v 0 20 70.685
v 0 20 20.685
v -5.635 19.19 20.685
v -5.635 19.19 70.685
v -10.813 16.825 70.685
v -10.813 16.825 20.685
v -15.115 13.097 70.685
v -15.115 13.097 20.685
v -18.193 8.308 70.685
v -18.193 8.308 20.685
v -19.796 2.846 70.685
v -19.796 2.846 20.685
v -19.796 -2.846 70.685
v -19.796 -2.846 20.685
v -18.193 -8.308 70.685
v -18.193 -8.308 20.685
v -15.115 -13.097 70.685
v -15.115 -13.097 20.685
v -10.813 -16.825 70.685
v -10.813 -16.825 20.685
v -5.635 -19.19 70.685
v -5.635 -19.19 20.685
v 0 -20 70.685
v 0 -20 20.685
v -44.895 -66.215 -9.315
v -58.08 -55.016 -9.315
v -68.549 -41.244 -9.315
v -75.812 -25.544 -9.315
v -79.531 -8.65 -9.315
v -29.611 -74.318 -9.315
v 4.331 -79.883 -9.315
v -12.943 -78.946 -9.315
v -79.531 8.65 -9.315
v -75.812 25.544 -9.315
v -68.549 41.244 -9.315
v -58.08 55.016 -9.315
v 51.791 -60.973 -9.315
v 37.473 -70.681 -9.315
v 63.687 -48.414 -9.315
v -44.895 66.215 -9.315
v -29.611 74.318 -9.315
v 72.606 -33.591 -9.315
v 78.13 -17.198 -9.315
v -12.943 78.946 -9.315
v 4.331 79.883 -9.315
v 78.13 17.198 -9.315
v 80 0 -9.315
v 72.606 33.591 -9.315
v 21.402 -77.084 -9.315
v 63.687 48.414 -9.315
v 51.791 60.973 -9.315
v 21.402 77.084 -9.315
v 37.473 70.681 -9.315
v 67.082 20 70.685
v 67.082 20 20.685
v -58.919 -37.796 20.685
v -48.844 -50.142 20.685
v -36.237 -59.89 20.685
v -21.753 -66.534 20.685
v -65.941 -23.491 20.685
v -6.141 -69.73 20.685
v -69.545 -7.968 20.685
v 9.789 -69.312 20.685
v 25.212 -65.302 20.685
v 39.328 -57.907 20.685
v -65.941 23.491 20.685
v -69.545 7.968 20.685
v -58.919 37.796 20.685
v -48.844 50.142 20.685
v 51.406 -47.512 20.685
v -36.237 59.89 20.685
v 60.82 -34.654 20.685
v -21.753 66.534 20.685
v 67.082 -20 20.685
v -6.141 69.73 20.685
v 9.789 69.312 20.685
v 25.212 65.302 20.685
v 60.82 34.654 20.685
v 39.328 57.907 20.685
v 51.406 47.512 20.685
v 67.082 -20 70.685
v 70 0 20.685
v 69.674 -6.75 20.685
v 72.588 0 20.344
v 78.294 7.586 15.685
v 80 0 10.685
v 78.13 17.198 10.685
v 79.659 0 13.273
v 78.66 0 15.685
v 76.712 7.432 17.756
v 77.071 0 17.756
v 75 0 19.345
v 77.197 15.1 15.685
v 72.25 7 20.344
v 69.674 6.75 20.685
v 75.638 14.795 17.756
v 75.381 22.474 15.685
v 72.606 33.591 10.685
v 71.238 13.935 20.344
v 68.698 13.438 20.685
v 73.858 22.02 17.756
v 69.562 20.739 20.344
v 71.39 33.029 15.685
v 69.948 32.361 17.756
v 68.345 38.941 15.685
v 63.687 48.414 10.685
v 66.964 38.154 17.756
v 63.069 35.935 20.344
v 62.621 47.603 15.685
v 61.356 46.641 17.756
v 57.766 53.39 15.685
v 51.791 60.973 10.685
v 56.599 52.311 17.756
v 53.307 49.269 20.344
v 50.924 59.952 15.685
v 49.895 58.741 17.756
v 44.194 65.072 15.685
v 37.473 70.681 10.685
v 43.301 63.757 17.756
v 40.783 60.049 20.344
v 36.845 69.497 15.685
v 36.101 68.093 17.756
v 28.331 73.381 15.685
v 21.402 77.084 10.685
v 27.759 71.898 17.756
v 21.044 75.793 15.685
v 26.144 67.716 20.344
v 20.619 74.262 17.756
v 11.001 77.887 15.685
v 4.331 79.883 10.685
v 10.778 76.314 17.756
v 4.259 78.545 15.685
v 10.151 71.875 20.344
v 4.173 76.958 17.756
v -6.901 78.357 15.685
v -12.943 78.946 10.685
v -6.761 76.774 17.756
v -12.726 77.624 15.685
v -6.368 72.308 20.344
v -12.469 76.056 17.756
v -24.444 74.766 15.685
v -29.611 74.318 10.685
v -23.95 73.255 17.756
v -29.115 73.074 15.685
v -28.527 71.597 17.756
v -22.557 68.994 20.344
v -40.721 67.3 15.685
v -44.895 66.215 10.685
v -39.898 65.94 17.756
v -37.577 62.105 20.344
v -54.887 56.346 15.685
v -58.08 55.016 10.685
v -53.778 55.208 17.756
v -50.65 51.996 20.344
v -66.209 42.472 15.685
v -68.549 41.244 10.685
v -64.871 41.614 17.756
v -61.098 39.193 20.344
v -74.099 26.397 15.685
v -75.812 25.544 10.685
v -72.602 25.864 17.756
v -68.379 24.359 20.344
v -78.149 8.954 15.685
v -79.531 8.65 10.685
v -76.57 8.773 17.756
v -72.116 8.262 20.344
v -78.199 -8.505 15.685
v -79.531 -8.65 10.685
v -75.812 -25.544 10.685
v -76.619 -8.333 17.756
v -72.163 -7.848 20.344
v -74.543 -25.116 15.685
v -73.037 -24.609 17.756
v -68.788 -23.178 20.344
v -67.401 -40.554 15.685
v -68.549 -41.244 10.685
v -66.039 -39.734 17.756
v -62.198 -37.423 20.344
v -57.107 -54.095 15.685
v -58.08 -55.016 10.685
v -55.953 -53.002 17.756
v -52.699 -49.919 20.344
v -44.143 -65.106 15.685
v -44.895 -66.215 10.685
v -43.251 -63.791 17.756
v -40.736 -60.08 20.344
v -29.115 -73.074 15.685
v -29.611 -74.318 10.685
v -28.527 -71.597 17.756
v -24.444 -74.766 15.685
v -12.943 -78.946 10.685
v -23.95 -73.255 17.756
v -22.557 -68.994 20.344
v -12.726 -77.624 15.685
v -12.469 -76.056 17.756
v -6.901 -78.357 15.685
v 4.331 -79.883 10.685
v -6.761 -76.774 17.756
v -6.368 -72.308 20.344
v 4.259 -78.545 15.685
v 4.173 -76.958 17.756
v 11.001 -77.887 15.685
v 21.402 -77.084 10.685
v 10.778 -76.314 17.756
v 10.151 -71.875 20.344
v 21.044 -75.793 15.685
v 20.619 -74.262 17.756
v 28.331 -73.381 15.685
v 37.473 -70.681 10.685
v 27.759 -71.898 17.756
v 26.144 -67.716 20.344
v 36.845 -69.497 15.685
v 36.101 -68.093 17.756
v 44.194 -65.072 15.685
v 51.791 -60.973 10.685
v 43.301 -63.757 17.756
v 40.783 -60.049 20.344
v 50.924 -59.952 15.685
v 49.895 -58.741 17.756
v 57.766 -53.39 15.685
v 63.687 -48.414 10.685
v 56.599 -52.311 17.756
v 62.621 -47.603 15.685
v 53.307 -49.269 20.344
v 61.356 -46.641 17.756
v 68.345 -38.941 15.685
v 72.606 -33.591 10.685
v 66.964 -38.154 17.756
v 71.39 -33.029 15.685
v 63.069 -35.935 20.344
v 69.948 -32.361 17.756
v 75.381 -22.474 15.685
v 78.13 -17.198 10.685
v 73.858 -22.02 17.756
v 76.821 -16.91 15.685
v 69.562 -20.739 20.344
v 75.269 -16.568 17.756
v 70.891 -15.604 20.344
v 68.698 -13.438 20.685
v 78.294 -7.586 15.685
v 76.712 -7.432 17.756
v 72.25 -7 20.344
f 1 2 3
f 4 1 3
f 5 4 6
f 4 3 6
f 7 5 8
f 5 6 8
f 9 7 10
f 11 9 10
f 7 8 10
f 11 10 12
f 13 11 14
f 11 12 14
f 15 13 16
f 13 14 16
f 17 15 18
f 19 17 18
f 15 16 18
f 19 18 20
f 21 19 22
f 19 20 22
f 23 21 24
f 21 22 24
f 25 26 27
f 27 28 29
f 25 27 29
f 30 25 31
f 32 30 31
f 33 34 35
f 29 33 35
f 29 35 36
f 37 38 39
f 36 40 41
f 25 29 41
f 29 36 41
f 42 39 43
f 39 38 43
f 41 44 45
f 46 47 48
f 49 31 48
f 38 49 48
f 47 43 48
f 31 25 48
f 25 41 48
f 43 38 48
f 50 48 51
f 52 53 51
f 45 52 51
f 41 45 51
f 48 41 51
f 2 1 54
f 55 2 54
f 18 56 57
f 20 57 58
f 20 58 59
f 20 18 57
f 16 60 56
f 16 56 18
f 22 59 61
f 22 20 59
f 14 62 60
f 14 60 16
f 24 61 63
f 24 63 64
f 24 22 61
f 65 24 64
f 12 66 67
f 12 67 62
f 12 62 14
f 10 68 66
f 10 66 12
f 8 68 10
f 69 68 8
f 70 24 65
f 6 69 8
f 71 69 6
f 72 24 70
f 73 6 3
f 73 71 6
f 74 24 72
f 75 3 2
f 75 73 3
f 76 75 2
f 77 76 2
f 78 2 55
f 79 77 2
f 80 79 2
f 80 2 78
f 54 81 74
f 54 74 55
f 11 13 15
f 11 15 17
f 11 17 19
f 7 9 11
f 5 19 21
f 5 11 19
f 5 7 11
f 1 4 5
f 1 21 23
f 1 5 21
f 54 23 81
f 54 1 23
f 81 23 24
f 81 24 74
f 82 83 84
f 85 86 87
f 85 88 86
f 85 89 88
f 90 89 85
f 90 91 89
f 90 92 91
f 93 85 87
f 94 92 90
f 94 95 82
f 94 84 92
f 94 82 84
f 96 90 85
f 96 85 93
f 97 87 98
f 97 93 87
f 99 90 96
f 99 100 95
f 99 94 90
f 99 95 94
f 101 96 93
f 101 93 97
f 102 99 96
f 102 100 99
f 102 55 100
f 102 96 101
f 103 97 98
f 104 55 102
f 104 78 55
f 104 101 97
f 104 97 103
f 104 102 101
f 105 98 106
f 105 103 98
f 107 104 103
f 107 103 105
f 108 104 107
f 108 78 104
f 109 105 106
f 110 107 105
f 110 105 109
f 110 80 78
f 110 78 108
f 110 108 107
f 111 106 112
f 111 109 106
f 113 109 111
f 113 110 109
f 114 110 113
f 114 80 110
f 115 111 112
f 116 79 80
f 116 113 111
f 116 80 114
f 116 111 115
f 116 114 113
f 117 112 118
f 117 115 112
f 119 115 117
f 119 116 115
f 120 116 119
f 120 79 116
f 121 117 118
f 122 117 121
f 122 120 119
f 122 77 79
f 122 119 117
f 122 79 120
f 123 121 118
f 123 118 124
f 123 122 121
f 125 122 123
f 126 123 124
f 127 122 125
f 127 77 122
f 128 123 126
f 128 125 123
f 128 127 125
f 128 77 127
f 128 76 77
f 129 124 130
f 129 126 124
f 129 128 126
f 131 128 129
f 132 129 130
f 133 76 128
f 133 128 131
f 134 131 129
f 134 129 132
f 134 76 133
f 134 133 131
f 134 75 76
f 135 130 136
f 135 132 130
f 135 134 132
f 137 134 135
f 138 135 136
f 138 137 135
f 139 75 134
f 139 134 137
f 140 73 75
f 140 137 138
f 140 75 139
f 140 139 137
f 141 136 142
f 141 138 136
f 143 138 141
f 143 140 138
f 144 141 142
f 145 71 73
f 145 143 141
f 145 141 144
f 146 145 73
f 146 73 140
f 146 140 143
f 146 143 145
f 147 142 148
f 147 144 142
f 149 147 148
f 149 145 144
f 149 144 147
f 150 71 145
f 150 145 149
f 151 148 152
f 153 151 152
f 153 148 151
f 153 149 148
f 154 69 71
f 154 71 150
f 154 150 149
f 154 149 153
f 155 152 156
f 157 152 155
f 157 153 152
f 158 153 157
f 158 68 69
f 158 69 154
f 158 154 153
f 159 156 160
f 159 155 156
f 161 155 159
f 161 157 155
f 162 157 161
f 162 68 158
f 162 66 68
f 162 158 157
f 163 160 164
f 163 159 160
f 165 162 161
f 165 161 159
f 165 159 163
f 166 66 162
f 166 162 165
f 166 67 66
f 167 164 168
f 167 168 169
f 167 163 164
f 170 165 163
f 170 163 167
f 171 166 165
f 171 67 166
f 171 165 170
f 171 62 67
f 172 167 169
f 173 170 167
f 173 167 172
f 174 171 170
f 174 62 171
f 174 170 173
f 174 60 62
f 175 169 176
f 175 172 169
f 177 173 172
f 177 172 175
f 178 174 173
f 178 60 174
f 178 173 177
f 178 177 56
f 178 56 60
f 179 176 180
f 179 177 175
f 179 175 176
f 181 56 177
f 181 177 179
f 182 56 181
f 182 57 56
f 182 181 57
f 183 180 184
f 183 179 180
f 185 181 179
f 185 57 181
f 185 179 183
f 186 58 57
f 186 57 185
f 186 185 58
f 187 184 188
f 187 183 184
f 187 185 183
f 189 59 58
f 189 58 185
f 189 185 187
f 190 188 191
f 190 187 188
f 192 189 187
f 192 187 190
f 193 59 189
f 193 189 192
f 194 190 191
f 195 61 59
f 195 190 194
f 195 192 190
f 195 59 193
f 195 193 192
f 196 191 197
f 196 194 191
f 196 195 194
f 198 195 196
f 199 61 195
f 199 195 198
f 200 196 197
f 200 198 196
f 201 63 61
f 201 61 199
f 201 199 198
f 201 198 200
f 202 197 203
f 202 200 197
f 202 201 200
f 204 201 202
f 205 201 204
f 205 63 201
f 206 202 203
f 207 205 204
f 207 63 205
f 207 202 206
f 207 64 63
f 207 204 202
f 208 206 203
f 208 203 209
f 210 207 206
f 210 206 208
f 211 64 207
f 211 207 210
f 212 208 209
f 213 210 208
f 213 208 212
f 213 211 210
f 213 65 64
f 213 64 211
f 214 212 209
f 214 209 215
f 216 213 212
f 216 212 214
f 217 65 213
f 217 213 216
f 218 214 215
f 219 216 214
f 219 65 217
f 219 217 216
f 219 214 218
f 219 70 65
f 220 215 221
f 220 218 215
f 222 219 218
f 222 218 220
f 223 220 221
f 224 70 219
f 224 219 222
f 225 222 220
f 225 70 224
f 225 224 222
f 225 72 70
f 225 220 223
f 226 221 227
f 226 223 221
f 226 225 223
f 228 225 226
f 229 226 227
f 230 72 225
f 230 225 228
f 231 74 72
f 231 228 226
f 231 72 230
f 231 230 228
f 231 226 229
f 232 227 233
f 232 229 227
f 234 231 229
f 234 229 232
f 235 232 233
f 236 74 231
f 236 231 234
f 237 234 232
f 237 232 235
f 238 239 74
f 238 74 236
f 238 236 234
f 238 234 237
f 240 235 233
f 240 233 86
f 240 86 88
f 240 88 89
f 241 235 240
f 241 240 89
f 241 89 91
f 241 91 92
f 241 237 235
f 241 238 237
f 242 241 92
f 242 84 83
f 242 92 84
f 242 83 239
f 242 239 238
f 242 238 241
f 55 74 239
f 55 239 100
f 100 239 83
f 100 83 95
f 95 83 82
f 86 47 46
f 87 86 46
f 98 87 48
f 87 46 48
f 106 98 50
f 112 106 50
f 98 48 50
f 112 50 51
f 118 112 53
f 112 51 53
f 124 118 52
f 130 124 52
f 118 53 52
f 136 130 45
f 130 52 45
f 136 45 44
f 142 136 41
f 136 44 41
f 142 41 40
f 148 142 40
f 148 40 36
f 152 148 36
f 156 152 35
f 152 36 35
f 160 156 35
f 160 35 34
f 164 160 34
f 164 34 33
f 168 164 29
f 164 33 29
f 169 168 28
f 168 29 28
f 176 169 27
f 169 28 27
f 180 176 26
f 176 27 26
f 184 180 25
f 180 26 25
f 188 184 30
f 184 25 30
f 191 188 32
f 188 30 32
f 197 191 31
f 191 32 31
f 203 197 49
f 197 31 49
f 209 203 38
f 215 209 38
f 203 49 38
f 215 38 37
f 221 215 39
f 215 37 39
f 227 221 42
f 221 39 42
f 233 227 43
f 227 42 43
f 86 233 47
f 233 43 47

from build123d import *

# Parameters (mm, degrees)
SKETCH1_R           = 40
BOSS_EXTRUDE1_DEPTH = 15
FILLET1_R           = 5
SKETCH2_R           = 10
BOSS_EXTRUDE2_DEPTH = 25
SCALE1_SCALE        = 2
SKETCH3_W           = 67.082039325
SKETCH3_H           = 40
BOSS_EXTRUDE3_DEPTH = 50


with BuildPart() as part:
    # Sketch1 → Boss-Extrude1 (new body)
    with BuildSketch(Plane.XY):
        Circle(SKETCH1_R)
    extrude(amount=BOSS_EXTRUDE1_DEPTH)

    # Fillet1
    fillet1_edges = [part.edges().sort_by_distance(p)[0] for p in [
        (-40, 0, 15),
    ]]
    fillet(fillet1_edges, radius=FILLET1_R)

    # Sketch2 → Boss-Extrude2 (add)
    with BuildSketch(Plane.XY.offset(15)):
        Circle(SKETCH2_R)
    extrude(amount=BOSS_EXTRUDE2_DEPTH)


with BuildPart() as part_1:
    # Scale1: scaled about (0, 0, 9.31508132)
    add(part.part.scale(SCALE1_SCALE).moved(Location((0, 0, -9.31508132))))

    # Sketch3 → Boss-Extrude3 (add)
    with BuildSketch(Plane.XY.offset(70.68491868)):
        with Locations((33.541019663, 0)):
            Rectangle(SKETCH3_W, SKETCH3_H)
    extrude(amount=-BOSS_EXTRUDE3_DEPTH)


solid = part_1.part
